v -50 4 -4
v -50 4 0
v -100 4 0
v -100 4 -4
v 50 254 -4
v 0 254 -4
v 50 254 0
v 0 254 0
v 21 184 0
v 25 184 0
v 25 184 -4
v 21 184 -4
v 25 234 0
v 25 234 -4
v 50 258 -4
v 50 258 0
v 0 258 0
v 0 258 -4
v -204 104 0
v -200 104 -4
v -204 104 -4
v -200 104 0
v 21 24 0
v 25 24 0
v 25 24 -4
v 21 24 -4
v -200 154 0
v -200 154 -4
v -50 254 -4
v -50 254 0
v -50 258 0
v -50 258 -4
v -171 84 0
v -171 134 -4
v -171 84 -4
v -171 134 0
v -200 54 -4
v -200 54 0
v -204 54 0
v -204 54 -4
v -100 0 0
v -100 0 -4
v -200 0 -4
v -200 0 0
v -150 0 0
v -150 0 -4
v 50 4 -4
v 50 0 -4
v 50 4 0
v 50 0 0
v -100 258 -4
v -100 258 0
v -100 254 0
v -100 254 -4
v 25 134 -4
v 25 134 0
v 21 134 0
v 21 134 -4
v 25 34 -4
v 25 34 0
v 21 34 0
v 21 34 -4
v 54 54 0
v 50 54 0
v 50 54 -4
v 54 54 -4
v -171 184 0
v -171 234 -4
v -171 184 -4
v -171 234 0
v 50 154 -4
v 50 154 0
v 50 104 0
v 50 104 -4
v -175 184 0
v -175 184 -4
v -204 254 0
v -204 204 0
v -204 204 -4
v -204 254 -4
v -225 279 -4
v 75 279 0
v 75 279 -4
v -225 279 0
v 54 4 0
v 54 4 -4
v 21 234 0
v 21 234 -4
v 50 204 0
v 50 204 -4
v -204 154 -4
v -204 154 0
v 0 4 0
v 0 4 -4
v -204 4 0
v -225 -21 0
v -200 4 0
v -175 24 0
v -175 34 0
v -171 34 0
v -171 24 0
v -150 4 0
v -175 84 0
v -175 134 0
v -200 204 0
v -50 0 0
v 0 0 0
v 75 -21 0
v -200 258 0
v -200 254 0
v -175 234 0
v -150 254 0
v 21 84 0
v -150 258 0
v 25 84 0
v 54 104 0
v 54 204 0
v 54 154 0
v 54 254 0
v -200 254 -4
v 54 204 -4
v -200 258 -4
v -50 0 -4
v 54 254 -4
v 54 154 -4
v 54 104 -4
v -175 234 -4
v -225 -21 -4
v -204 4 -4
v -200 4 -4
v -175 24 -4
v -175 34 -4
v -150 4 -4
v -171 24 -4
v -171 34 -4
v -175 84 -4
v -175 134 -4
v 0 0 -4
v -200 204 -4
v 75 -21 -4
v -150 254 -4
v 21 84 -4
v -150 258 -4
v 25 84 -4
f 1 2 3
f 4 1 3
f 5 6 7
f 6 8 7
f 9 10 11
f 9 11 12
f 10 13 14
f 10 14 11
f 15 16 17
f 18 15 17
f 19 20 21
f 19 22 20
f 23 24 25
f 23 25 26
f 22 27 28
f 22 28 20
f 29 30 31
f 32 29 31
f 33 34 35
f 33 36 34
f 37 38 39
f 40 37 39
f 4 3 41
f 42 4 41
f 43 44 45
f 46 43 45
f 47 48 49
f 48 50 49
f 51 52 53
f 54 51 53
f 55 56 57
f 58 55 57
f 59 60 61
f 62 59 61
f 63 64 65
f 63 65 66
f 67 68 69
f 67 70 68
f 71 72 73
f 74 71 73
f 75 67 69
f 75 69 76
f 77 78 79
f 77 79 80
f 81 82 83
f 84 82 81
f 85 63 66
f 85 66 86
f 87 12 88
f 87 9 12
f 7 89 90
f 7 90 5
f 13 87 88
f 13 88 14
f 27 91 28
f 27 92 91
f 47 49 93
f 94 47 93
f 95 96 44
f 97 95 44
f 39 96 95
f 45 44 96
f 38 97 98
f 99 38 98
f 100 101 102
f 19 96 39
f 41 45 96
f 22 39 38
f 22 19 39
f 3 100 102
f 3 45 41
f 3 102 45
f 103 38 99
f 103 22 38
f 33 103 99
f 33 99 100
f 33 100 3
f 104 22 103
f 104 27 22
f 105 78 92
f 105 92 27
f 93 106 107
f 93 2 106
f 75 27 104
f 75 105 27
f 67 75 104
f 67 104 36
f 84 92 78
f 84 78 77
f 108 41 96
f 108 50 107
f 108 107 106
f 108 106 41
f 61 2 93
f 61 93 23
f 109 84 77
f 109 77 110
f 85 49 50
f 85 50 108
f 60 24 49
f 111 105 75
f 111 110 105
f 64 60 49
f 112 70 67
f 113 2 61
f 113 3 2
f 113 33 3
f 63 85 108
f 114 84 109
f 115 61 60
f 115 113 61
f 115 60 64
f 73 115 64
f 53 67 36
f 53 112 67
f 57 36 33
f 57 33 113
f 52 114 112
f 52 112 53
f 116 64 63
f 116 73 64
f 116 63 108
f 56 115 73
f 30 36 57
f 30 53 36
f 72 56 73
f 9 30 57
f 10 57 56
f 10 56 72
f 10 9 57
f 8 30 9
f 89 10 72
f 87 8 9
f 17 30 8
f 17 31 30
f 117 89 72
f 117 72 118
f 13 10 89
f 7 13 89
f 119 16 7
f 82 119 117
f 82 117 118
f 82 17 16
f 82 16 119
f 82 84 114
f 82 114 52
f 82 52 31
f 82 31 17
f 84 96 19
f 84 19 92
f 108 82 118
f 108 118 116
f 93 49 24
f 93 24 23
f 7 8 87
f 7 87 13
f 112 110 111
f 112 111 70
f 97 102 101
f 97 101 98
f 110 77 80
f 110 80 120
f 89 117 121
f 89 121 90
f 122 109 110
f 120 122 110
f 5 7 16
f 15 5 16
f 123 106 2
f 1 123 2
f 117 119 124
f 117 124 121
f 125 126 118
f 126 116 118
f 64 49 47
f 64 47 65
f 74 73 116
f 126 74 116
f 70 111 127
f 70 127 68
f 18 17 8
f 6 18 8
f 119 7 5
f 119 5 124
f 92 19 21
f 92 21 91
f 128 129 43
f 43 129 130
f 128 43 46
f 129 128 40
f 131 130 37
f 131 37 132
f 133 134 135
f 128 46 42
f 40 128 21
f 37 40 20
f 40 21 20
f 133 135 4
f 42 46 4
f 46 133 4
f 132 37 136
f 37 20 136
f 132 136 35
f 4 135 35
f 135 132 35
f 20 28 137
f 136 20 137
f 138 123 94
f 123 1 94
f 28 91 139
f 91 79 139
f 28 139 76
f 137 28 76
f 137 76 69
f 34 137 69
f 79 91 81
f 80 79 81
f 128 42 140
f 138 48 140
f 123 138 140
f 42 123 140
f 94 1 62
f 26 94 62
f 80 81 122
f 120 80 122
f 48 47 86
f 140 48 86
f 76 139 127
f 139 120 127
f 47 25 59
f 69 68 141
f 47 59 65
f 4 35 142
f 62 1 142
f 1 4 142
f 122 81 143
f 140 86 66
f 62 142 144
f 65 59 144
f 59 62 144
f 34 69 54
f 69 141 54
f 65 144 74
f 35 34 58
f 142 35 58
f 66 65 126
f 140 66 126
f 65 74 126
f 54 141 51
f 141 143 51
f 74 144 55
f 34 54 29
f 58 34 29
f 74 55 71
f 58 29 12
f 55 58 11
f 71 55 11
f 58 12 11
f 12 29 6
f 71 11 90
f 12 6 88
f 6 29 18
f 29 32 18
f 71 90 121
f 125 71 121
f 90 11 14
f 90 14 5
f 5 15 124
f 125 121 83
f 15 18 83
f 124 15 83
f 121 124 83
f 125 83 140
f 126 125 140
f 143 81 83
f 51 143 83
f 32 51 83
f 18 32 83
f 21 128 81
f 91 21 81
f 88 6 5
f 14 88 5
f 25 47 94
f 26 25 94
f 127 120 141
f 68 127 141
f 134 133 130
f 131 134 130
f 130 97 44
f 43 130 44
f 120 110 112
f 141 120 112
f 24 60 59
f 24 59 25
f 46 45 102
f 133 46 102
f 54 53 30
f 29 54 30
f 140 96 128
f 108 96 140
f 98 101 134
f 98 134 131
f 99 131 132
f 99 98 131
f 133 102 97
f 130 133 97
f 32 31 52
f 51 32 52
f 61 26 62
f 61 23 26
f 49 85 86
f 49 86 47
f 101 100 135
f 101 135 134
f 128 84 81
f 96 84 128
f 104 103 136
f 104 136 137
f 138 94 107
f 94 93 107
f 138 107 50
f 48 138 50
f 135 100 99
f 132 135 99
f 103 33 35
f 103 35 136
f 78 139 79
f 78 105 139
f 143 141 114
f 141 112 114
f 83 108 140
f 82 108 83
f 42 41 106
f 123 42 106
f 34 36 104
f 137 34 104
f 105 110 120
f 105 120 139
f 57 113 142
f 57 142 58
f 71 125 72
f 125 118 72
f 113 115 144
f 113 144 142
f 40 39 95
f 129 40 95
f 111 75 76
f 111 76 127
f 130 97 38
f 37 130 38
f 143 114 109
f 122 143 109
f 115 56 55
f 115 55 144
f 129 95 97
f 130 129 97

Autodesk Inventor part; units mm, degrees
ref_plane "YZ Plane" through (0, 0, 0) normal (1, 0, 0) x (0, 1, 0)
ref_plane "XZ Plane" through (0, 0, 0) normal (0, 1, 0) x (-1, 0, 0)
ref_plane "XY Plane" through (0, 0, 0) normal (0, 0, 1) x (1, 0, 0)
sketch "Sketch1" plane through (0, 0, 0) normal (0, 0, 1) x (1, 0, 0)
  line L0 (120, -66) -> (20, -66) construction
  line L1 (20, -66) -> (20, -26) construction
  line L2 (20, -26) -> (120, -26) construction
  line L3 (120, -26) -> (120, -66) construction
  line L4 (-275, -71) -> (125, -71) construction
  line L5 (125, -71) -> (125, 329) construction
  line L6 (125, 329) -> (-275, 329) construction
  line L7 (-275, 329) -> (-275, -71) construction
  line L8 (50, 104) -> (50, 154) construction
  line L9 (50, 154) -> (54, 154) construction
  line L10 (54, 154) -> (54, 104) construction
  line L11 (54, 104) -> (50, 104) construction
  line L12 (-50, 254) -> (-100, 254) construction
  line L13 (-100, 254) -> (-100, 258) construction
  line L14 (-100, 258) -> (-50, 258) construction
  line L15 (-50, 258) -> (-50, 254) construction
  line L16 (50, 258) -> (50, 254) construction
  line L17 (50, 254) -> (54, 254) construction
  line L18 (54, 254) -> (54, 204) construction
  line L19 (54, 204) -> (50, 204) construction
  line L20 (50, 204) -> (50, 254) construction
  line L21 (50, 254) -> (0, 254) construction
  line L22 (0, 254) -> (0, 258) construction
  line L23 (0, 258) -> (50, 258) construction
  line L24 (54, 4) -> (50, 4) construction
  line L25 (50, 4) -> (50, 0) construction
  line L26 (50, 0) -> (0, 0) construction
  line L27 (0, 0) -> (0, 4) construction
  line L28 (0, 4) -> (50, 4) construction
  line L29 (50, 4) -> (50, 54) construction
  line L30 (50, 54) -> (54, 54) construction
  line L31 (54, 54) -> (54, 4) construction
  line L32 (-100, 4) -> (-50, 4) construction
  line L33 (-50, 4) -> (-50, 0) construction
  line L34 (-50, 0) -> (-100, 0) construction
  line L35 (-100, 0) -> (-100, 4) construction
  line L36 (-204, 254) -> (-200, 254) construction
  line L37 (-200, 254) -> (-200, 258) construction
  line L38 (-200, 258) -> (-150, 258) construction
  line L39 (-150, 258) -> (-150, 254) construction
  line L40 (-150, 254) -> (-200, 254) construction
  line L41 (-200, 254) -> (-200, 204) construction
  line L42 (-200, 204) -> (-204, 204) construction
  line L43 (-204, 204) -> (-204, 254) construction
  line L44 (-200, 154) -> (-200, 104) construction
  line L45 (-200, 104) -> (-204, 104) construction
  line L46 (-204, 104) -> (-204, 154) construction
  line L47 (-204, 154) -> (-200, 154) construction
  line L48 (-200, 54) -> (-200, 4) construction
  line L49 (-200, 4) -> (-150, 4) construction
  line L50 (-150, 4) -> (-150, 0) construction
  line L51 (-150, 0) -> (-200, 0) construction
  line L52 (-200, 0) -> (-200, 4) construction
  line L53 (-200, 4) -> (-204, 4) construction
  line L54 (-204, 4) -> (-204, 54) construction
  line L55 (-204, 54) -> (-200, 54) construction
  line L56 (-275, -71) -> (125, -71) construction
  line L57 (125, -71) -> (125, 329) construction
  line L58 (125, 329) -> (-275, 329) construction
  line L59 (-275, 329) -> (-275, -71) construction
  line L60 (-275, -71) -> (125, 329) construction
  line L61 (75, 279) -> (-225, 279)
  line L62 (-225, 279) -> (-225, -21)
  line L63 (-225, -21) -> (75, -21)
  line L64 (75, -21) -> (75, 279)
  line L65 (75, 279) -> (-225, -21) construction
  line L66 (-225, 279) -> (75, -21) construction
  line L67 (-204, 4) -> (-200, 4)
  line L68 (-200, 4) -> (-200, 54)
  line L69 (-200, 54) -> (-204, 54)
  line L70 (-204, 54) -> (-204, 4)
  line L71 (-200, 104) -> (-204, 104)
  line L72 (-204, 104) -> (-204, 154)
  line L73 (-204, 154) -> (-200, 154)
  line L74 (-200, 154) -> (-200, 104)
  line L75 (-200, 204) -> (-204, 204)
  line L76 (-204, 204) -> (-204, 254)
  line L77 (-204, 254) -> (-200, 254)
  line L78 (-200, 254) -> (-200, 204)
  line L79 (-200, 254) -> (-150, 254)
  line L80 (-150, 254) -> (-150, 258)
  line L81 (-150, 258) -> (-200, 258)
  line L82 (-200, 258) -> (-200, 254)
  line L83 (-100, 254) -> (-50, 254)
  line L84 (-50, 254) -> (-50, 258)
  line L85 (-50, 258) -> (-100, 258)
  line L86 (-100, 258) -> (-100, 254)
  line L87 (0, 254) -> (50, 254)
  line L88 (50, 254) -> (50, 258)
  line L89 (50, 258) -> (0, 258)
  line L90 (0, 258) -> (0, 254)
  line L91 (50, 254) -> (54, 254)
  line L92 (54, 254) -> (54, 204)
  line L93 (54, 204) -> (50, 204)
  line L94 (50, 204) -> (50, 254)
  line L95 (54, 154) -> (50, 154)
  line L96 (50, 154) -> (50, 104)
  line L97 (50, 104) -> (54, 104)
  line L98 (54, 104) -> (54, 154)
  line L99 (54, 4) -> (50, 4)
  line L100 (50, 4) -> (50, 54)
  line L101 (50, 54) -> (54, 54)
  line L102 (54, 54) -> (54, 4)
  line L103 (50, 4) -> (0, 4)
  line L104 (0, 4) -> (0, 0)
  line L105 (0, 0) -> (50, 0)
  line L106 (50, 0) -> (50, 4)
  line L107 (-100, 0) -> (-50, 0)
  line L108 (-50, 0) -> (-50, 4)
  line L109 (-50, 4) -> (-100, 4)
  line L110 (-100, 4) -> (-100, 0)
  line L111 (-200, 0) -> (-150, 0)
  line L112 (-150, 0) -> (-150, 4)
  line L113 (-150, 4) -> (-200, 4)
  line L114 (-200, 4) -> (-200, 0)
  point P0 (-75, 129)
  dimension "d0" = 300
  dimension "d1" = 300
extrude "Extrusion1" add sketch "Sketch1" against normal blind 4
sketch "Sketch2" plane through (0, 0, 0) normal (0, 0, 1) x (1, 0, 0)
  line L0 (-175, 234) -> (-171, 234)
  line L1 (-171, 234) -> (-171, 184)
  line L2 (-171, 184) -> (-175, 184)
  line L3 (-175, 184) -> (-175, 234)
  line L4 (-175, 184) -> (-171, 184)
  line L5 (-171, 184) -> (-171, 134)
  line L6 (-171, 134) -> (-175, 134)
  line L7 (-175, 134) -> (-175, 184)
  line L8 (-175, 134) -> (-171, 134)
  line L9 (-171, 134) -> (-171, 84)
  line L10 (-171, 84) -> (-175, 84)
  line L11 (-175, 84) -> (-175, 134)
  line L12 (-200, 254) -> (-200, 204) projected
  line L13 (-150, 254) -> (-200, 254) projected
  line L14 (-175, 84) -> (-171, 84)
  line L15 (-171, 84) -> (-171, 34)
  line L16 (-171, 34) -> (-175, 34)
  line L17 (-175, 34) -> (-175, 84)
  line L18 (-175, 34) -> (-171, 34)
  line L19 (-171, 34) -> (-171, 24)
  line L20 (-171, 24) -> (-175, 24)
  line L21 (-175, 24) -> (-175, 34)
  line L22 (-200, 4) -> (-150, 4) projected
  line L23 (25, 184) -> (21, 184)
  line L24 (21, 184) -> (25, 184)
  line L25 (21, 234) -> (25, 234)
  line L26 (25, 234) -> (25, 184)
  line L27 (21, 184) -> (21, 234)
  line L28 (25, 184) -> (25, 134)
  line L29 (25, 134) -> (21, 134)
  line L30 (21, 134) -> (25, 134)
  line L31 (25, 134) -> (25, 84)
  line L32 (25, 84) -> (21, 84)
  line L33 (21, 84) -> (21, 134)
  line L34 (21, 134) -> (21, 184)
  line L35 (21, 84) -> (25, 84)
  line L36 (25, 84) -> (25, 34)
  line L37 (21, 34) -> (21, 84)
  line L38 (25, 34) -> (21, 34)
  line L39 (21, 34) -> (25, 34)
  line L40 (25, 34) -> (25, 24)
  line L41 (21, 24) -> (21, 34)
  line L42 (25, 24) -> (21, 24)
  point P0 (0, 0)
  point P1 (-173, 234)
  point P2 (-173, 24)
  point P3 (23, 234)
  point P4 (23, 24)
  dimension "d4" = 4
  dimension "d5" = 50
  dimension "d6" = 4
  dimension "d7" = 50
  dimension "d8" = 4
  dimension "d9" = 50
  dimension "d10" = 25
  dimension "d11" = 20
  dimension "d12" = 4
  dimension "d13" = 50
  dimension "d14" = 4
  dimension "d15" = 20
  dimension "d20" = 196
extrude "Extrusion2" cut sketch "Sketch2" against normal blind 10 contours L0 L1 L2 L3 | L6 L9 L10 L11 | L16 L19 L20 L21 | L23 L27 L25 L26 | L31 L32 L33 L29 | L40 L42 L41 L38
properties part number "Roof_V1"
